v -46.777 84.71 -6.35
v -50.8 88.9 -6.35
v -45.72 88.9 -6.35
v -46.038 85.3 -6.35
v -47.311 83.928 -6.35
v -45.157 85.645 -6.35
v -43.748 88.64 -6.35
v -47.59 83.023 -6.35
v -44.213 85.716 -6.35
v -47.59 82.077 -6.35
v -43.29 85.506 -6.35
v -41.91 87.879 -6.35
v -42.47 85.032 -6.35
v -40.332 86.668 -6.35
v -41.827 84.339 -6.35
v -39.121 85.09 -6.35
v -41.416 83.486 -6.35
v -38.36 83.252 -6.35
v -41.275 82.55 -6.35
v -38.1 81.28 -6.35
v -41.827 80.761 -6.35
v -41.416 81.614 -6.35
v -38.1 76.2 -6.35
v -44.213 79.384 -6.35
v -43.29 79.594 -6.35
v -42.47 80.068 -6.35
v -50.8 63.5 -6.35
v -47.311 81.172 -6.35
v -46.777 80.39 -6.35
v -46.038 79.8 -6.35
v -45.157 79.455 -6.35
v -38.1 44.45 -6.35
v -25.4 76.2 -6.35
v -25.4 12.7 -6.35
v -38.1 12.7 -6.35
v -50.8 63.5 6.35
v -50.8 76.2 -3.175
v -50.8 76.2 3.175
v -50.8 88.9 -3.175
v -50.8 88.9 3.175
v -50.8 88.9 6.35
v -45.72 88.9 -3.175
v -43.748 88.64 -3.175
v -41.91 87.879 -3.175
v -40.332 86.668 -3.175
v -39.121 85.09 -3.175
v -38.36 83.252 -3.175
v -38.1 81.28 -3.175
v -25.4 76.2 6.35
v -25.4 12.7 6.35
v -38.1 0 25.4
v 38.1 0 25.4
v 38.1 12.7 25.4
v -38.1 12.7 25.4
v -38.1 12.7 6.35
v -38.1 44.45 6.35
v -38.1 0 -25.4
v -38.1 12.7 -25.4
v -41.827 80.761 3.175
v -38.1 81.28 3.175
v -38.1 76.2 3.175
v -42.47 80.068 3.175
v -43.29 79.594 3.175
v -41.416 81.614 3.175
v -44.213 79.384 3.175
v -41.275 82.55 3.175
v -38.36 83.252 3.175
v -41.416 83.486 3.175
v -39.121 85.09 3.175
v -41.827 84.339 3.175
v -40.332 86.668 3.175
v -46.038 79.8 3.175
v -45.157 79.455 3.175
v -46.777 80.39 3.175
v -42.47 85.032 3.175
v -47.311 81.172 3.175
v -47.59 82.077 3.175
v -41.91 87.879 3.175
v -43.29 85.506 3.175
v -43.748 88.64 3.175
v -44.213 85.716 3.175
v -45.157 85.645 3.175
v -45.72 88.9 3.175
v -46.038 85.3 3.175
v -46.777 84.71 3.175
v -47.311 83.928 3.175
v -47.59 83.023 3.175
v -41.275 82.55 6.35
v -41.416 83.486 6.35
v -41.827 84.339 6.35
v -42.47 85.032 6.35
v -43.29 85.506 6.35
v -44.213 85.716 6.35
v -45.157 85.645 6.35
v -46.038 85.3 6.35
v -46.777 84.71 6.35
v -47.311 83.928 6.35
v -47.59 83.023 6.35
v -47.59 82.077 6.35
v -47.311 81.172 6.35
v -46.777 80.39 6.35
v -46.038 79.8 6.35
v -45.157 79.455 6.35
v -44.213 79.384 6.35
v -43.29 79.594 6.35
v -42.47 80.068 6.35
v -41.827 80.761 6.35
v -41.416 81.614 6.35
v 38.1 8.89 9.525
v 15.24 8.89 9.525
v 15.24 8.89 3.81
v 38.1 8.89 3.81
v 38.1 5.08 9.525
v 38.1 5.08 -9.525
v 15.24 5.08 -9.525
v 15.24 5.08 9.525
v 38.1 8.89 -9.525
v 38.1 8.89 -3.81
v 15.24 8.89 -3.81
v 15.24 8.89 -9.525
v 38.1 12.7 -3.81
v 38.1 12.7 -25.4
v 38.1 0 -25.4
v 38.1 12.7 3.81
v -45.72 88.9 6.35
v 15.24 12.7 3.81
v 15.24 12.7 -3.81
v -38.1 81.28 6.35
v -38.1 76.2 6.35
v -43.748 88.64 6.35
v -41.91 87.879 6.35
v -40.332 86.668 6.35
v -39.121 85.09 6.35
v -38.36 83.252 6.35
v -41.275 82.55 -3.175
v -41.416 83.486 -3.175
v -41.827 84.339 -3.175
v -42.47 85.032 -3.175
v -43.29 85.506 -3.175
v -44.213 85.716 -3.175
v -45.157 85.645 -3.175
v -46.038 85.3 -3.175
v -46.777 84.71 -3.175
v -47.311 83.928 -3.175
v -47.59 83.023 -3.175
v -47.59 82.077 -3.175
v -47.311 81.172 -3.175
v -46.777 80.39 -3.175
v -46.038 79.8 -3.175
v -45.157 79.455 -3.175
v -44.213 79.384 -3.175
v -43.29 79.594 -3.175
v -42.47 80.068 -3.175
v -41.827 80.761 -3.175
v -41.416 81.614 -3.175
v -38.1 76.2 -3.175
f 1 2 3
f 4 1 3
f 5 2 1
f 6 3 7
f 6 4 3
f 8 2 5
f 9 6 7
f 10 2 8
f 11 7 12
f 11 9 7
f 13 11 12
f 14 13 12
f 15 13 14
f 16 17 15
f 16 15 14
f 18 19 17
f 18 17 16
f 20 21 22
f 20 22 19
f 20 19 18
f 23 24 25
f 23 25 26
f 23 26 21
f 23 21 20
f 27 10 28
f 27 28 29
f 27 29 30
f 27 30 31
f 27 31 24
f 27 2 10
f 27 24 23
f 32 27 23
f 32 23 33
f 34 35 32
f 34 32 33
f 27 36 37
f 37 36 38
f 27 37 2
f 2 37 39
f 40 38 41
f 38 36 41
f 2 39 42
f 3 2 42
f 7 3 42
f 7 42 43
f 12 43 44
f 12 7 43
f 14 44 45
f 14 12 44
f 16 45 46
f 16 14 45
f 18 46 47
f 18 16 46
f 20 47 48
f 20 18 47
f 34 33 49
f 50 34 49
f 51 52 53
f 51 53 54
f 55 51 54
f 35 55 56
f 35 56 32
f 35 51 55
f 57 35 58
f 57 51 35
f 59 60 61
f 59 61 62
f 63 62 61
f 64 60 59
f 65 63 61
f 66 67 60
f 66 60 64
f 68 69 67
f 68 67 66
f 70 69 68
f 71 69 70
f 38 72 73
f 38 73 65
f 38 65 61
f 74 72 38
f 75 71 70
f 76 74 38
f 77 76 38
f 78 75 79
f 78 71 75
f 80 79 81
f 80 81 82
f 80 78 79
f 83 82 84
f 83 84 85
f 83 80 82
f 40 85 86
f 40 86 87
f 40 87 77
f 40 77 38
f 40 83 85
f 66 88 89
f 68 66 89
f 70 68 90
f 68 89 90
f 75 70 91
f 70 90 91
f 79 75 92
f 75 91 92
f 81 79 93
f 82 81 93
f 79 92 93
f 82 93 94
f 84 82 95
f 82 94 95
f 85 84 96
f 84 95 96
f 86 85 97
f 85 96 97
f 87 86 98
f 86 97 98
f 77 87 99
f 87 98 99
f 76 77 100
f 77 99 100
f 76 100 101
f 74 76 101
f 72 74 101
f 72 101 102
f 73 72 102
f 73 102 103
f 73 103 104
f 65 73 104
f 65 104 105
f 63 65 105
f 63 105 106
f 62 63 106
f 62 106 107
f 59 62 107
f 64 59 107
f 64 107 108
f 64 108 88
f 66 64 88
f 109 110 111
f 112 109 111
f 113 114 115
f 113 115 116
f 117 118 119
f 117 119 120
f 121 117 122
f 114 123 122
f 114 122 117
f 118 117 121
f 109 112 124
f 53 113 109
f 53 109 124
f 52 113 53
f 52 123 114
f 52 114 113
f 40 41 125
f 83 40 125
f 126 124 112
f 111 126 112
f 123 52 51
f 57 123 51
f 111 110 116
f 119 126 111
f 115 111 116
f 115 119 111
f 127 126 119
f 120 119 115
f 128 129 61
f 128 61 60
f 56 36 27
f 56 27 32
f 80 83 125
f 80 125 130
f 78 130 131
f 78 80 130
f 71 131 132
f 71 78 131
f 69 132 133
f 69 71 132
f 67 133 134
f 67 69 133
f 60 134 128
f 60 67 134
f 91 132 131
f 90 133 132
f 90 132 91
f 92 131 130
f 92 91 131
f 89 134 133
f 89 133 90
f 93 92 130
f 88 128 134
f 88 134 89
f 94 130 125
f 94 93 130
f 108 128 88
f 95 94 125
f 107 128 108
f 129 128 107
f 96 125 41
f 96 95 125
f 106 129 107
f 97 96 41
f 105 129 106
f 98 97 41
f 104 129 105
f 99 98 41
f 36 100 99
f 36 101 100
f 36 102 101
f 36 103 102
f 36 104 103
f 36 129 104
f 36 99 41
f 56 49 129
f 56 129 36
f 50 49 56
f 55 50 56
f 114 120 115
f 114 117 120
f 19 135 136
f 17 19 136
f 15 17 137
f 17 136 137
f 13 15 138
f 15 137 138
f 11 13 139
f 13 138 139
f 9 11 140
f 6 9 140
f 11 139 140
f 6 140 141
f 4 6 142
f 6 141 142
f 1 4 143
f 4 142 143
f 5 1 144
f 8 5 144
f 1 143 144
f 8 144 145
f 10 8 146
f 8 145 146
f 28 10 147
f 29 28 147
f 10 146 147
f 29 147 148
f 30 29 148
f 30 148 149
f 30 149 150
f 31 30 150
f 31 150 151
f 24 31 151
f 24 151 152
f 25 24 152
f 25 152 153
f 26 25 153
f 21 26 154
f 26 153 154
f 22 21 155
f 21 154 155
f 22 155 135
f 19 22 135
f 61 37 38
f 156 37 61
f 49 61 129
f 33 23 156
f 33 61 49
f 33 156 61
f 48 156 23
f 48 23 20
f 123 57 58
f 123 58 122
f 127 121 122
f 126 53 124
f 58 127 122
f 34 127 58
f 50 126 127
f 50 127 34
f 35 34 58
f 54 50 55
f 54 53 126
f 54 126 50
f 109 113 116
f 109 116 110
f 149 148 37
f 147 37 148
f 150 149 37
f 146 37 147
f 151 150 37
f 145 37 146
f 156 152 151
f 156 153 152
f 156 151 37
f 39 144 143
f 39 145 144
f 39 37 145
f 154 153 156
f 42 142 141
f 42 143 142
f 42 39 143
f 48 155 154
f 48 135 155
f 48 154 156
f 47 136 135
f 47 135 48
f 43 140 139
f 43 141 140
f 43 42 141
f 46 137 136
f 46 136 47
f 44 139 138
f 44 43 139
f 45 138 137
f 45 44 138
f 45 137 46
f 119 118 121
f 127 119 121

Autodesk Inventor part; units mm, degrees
ref_plane "YZ Plane" through (0, 0, 0) normal (1, 0, 0) x (0, 1, 0)
ref_plane "XZ Plane" through (0, 0, 0) normal (0, 1, 0) x (-1, 0, 0)
ref_plane "XY Plane" through (0, 0, 0) normal (0, 0, 1) x (1, 0, 0)
sketch "Sketch1" plane through (0, 0, 0) normal (0, 1, 0) x (-1, 0, 0)
  line L0 (-38.1, 25.4) -> (38.1, 25.4)
  line L1 (38.1, 25.4) -> (38.1, -25.4)
  line L2 (38.1, -25.4) -> (-38.1, -25.4)
  line L3 (-38.1, -25.4) -> (-38.1, 25.4)
  line L4 (-38.1, 25.4) -> (38.1, -25.4) construction
  line L5 (38.1, 25.4) -> (-38.1, -25.4) construction
  point P0 (0, 0)
  dimension "d0" = 76.2
  dimension "d1" = 50.8
extrude "Extrusion1" add sketch "Sketch1" along normal blind 12.7
sketch "Sketch2" plane through (0, 12.7, 0) normal (0, 1, 0) x (1, 0, 0)
  line L0 (-38.1, 25.4) -> (-38.1, -25.4) projected
  line L1 (-38.1, 6.35) -> (-25.4, 6.35)
  line L2 (-25.4, 6.35) -> (-25.4, -6.35)
  line L3 (-25.4, -6.35) -> (-38.1, -6.35)
  line L4 (-38.1, -6.35) -> (-38.1, 6.35)
  point P0 (0, 0)
  dimension "d4" = 12.7
  dimension "d5" = 12.7
  dimension "d6" = 6.35
extrude "Extrusion2" add sketch "Sketch2" along normal blind 63.5
sketch "Sketch4" plane through (-38.1, 12.7, 6.35) normal (0, 0, 1) x (1, 0, 0)
  line L0 (0, 0) -> (0, 63.5) projected
  line L1 (0, 50.8) -> (-12.7, 50.8)
  line L2 (-12.7, 50.8) -> (-12.7, 76.2)
  line L3 (-12.7, 76.2) -> (0, 76.2)
  line L4 (0, 76.2) -> (0, 50.8)
  line L5 (0, 63.5) -> (12.7, 63.5) projected
  line L6 (-12.7, 50.8) -> (0, 31.75)
  circle A0 centre (-6.35, 69.85) radius 3.175
  point P0 (38.1, -12.7)
  dimension "d13" = 12.7
  dimension "d14" = 25.4
  dimension "d15" = 12.7
  dimension "d22" = 6.35
  dimension "d23" = 6.35
  dimension "d24" = 6.35
extrude "Extrusion4" add sketch "Sketch4" against normal blind 12.7
sketch "Sketch5" plane through (-50.8, 88.9, 6.35) normal (0, 1, 0) x (1, 0, 0)
  line L0 (0, 0) -> (0, 12.7) projected
  line L1 (12.7, 12.7) -> (12.7, 0) projected
  line L2 (0, 9.525) -> (12.7, 9.525)
  line L3 (12.7, 9.525) -> (12.7, 3.175)
  line L4 (12.7, 3.175) -> (0, 3.175)
  line L5 (0, 3.175) -> (0, 9.525)
  line L6 (12.7, 0) -> (0, 0) projected
  point P0 (50.8, 6.35)
  point P1 (0, 3.175)
  dimension "d18" = 6.35
  dimension "d19" = 3.175
extrude "Extrusion5" cut sketch "Sketch5" against normal blind 12.7 contours L0 L2 L1 L4
sketch "Sketch6" plane through (38.1, 0, 25.4) normal (1, 0, 0) x (0, 0, -1)
  line L0 (15.875, 8.89) -> (34.925, 8.89)
  line L1 (34.925, 8.89) -> (34.925, 5.08)
  line L2 (34.925, 5.08) -> (15.875, 5.08)
  line L3 (15.875, 5.08) -> (15.875, 8.89)
  line L4 (50.8, 0) -> (50.8, 12.7) projected
  line L5 (0, 12.7) -> (50.8, 12.7) projected
  line L6 (21.59, 8.89) -> (29.21, 8.89)
  line L7 (29.21, 8.89) -> (29.21, 12.7)
  line L8 (29.21, 12.7) -> (21.59, 12.7)
  line L9 (21.59, 12.7) -> (21.59, 8.89)
  point P0 (25.4, 0)
  point P1 (29.21, 12.7)
  dimension "d25" = 19.05
  dimension "d26" = 3.81
  dimension "d27" = 15.875
  dimension "d28" = 3.81
  dimension "d29" = 7.62
  dimension "d30" = 3.81
  dimension "d31" = 5.715
extrude "Extrusion6" cut sketch "Sketch6" against normal blind 22.86
fillet "Fillet1" radius 7.62 2 edges at (-38.1, 88.9, 4.7625) (-38.1, 88.9, -4.7625)
properties part number "Press_Base"
